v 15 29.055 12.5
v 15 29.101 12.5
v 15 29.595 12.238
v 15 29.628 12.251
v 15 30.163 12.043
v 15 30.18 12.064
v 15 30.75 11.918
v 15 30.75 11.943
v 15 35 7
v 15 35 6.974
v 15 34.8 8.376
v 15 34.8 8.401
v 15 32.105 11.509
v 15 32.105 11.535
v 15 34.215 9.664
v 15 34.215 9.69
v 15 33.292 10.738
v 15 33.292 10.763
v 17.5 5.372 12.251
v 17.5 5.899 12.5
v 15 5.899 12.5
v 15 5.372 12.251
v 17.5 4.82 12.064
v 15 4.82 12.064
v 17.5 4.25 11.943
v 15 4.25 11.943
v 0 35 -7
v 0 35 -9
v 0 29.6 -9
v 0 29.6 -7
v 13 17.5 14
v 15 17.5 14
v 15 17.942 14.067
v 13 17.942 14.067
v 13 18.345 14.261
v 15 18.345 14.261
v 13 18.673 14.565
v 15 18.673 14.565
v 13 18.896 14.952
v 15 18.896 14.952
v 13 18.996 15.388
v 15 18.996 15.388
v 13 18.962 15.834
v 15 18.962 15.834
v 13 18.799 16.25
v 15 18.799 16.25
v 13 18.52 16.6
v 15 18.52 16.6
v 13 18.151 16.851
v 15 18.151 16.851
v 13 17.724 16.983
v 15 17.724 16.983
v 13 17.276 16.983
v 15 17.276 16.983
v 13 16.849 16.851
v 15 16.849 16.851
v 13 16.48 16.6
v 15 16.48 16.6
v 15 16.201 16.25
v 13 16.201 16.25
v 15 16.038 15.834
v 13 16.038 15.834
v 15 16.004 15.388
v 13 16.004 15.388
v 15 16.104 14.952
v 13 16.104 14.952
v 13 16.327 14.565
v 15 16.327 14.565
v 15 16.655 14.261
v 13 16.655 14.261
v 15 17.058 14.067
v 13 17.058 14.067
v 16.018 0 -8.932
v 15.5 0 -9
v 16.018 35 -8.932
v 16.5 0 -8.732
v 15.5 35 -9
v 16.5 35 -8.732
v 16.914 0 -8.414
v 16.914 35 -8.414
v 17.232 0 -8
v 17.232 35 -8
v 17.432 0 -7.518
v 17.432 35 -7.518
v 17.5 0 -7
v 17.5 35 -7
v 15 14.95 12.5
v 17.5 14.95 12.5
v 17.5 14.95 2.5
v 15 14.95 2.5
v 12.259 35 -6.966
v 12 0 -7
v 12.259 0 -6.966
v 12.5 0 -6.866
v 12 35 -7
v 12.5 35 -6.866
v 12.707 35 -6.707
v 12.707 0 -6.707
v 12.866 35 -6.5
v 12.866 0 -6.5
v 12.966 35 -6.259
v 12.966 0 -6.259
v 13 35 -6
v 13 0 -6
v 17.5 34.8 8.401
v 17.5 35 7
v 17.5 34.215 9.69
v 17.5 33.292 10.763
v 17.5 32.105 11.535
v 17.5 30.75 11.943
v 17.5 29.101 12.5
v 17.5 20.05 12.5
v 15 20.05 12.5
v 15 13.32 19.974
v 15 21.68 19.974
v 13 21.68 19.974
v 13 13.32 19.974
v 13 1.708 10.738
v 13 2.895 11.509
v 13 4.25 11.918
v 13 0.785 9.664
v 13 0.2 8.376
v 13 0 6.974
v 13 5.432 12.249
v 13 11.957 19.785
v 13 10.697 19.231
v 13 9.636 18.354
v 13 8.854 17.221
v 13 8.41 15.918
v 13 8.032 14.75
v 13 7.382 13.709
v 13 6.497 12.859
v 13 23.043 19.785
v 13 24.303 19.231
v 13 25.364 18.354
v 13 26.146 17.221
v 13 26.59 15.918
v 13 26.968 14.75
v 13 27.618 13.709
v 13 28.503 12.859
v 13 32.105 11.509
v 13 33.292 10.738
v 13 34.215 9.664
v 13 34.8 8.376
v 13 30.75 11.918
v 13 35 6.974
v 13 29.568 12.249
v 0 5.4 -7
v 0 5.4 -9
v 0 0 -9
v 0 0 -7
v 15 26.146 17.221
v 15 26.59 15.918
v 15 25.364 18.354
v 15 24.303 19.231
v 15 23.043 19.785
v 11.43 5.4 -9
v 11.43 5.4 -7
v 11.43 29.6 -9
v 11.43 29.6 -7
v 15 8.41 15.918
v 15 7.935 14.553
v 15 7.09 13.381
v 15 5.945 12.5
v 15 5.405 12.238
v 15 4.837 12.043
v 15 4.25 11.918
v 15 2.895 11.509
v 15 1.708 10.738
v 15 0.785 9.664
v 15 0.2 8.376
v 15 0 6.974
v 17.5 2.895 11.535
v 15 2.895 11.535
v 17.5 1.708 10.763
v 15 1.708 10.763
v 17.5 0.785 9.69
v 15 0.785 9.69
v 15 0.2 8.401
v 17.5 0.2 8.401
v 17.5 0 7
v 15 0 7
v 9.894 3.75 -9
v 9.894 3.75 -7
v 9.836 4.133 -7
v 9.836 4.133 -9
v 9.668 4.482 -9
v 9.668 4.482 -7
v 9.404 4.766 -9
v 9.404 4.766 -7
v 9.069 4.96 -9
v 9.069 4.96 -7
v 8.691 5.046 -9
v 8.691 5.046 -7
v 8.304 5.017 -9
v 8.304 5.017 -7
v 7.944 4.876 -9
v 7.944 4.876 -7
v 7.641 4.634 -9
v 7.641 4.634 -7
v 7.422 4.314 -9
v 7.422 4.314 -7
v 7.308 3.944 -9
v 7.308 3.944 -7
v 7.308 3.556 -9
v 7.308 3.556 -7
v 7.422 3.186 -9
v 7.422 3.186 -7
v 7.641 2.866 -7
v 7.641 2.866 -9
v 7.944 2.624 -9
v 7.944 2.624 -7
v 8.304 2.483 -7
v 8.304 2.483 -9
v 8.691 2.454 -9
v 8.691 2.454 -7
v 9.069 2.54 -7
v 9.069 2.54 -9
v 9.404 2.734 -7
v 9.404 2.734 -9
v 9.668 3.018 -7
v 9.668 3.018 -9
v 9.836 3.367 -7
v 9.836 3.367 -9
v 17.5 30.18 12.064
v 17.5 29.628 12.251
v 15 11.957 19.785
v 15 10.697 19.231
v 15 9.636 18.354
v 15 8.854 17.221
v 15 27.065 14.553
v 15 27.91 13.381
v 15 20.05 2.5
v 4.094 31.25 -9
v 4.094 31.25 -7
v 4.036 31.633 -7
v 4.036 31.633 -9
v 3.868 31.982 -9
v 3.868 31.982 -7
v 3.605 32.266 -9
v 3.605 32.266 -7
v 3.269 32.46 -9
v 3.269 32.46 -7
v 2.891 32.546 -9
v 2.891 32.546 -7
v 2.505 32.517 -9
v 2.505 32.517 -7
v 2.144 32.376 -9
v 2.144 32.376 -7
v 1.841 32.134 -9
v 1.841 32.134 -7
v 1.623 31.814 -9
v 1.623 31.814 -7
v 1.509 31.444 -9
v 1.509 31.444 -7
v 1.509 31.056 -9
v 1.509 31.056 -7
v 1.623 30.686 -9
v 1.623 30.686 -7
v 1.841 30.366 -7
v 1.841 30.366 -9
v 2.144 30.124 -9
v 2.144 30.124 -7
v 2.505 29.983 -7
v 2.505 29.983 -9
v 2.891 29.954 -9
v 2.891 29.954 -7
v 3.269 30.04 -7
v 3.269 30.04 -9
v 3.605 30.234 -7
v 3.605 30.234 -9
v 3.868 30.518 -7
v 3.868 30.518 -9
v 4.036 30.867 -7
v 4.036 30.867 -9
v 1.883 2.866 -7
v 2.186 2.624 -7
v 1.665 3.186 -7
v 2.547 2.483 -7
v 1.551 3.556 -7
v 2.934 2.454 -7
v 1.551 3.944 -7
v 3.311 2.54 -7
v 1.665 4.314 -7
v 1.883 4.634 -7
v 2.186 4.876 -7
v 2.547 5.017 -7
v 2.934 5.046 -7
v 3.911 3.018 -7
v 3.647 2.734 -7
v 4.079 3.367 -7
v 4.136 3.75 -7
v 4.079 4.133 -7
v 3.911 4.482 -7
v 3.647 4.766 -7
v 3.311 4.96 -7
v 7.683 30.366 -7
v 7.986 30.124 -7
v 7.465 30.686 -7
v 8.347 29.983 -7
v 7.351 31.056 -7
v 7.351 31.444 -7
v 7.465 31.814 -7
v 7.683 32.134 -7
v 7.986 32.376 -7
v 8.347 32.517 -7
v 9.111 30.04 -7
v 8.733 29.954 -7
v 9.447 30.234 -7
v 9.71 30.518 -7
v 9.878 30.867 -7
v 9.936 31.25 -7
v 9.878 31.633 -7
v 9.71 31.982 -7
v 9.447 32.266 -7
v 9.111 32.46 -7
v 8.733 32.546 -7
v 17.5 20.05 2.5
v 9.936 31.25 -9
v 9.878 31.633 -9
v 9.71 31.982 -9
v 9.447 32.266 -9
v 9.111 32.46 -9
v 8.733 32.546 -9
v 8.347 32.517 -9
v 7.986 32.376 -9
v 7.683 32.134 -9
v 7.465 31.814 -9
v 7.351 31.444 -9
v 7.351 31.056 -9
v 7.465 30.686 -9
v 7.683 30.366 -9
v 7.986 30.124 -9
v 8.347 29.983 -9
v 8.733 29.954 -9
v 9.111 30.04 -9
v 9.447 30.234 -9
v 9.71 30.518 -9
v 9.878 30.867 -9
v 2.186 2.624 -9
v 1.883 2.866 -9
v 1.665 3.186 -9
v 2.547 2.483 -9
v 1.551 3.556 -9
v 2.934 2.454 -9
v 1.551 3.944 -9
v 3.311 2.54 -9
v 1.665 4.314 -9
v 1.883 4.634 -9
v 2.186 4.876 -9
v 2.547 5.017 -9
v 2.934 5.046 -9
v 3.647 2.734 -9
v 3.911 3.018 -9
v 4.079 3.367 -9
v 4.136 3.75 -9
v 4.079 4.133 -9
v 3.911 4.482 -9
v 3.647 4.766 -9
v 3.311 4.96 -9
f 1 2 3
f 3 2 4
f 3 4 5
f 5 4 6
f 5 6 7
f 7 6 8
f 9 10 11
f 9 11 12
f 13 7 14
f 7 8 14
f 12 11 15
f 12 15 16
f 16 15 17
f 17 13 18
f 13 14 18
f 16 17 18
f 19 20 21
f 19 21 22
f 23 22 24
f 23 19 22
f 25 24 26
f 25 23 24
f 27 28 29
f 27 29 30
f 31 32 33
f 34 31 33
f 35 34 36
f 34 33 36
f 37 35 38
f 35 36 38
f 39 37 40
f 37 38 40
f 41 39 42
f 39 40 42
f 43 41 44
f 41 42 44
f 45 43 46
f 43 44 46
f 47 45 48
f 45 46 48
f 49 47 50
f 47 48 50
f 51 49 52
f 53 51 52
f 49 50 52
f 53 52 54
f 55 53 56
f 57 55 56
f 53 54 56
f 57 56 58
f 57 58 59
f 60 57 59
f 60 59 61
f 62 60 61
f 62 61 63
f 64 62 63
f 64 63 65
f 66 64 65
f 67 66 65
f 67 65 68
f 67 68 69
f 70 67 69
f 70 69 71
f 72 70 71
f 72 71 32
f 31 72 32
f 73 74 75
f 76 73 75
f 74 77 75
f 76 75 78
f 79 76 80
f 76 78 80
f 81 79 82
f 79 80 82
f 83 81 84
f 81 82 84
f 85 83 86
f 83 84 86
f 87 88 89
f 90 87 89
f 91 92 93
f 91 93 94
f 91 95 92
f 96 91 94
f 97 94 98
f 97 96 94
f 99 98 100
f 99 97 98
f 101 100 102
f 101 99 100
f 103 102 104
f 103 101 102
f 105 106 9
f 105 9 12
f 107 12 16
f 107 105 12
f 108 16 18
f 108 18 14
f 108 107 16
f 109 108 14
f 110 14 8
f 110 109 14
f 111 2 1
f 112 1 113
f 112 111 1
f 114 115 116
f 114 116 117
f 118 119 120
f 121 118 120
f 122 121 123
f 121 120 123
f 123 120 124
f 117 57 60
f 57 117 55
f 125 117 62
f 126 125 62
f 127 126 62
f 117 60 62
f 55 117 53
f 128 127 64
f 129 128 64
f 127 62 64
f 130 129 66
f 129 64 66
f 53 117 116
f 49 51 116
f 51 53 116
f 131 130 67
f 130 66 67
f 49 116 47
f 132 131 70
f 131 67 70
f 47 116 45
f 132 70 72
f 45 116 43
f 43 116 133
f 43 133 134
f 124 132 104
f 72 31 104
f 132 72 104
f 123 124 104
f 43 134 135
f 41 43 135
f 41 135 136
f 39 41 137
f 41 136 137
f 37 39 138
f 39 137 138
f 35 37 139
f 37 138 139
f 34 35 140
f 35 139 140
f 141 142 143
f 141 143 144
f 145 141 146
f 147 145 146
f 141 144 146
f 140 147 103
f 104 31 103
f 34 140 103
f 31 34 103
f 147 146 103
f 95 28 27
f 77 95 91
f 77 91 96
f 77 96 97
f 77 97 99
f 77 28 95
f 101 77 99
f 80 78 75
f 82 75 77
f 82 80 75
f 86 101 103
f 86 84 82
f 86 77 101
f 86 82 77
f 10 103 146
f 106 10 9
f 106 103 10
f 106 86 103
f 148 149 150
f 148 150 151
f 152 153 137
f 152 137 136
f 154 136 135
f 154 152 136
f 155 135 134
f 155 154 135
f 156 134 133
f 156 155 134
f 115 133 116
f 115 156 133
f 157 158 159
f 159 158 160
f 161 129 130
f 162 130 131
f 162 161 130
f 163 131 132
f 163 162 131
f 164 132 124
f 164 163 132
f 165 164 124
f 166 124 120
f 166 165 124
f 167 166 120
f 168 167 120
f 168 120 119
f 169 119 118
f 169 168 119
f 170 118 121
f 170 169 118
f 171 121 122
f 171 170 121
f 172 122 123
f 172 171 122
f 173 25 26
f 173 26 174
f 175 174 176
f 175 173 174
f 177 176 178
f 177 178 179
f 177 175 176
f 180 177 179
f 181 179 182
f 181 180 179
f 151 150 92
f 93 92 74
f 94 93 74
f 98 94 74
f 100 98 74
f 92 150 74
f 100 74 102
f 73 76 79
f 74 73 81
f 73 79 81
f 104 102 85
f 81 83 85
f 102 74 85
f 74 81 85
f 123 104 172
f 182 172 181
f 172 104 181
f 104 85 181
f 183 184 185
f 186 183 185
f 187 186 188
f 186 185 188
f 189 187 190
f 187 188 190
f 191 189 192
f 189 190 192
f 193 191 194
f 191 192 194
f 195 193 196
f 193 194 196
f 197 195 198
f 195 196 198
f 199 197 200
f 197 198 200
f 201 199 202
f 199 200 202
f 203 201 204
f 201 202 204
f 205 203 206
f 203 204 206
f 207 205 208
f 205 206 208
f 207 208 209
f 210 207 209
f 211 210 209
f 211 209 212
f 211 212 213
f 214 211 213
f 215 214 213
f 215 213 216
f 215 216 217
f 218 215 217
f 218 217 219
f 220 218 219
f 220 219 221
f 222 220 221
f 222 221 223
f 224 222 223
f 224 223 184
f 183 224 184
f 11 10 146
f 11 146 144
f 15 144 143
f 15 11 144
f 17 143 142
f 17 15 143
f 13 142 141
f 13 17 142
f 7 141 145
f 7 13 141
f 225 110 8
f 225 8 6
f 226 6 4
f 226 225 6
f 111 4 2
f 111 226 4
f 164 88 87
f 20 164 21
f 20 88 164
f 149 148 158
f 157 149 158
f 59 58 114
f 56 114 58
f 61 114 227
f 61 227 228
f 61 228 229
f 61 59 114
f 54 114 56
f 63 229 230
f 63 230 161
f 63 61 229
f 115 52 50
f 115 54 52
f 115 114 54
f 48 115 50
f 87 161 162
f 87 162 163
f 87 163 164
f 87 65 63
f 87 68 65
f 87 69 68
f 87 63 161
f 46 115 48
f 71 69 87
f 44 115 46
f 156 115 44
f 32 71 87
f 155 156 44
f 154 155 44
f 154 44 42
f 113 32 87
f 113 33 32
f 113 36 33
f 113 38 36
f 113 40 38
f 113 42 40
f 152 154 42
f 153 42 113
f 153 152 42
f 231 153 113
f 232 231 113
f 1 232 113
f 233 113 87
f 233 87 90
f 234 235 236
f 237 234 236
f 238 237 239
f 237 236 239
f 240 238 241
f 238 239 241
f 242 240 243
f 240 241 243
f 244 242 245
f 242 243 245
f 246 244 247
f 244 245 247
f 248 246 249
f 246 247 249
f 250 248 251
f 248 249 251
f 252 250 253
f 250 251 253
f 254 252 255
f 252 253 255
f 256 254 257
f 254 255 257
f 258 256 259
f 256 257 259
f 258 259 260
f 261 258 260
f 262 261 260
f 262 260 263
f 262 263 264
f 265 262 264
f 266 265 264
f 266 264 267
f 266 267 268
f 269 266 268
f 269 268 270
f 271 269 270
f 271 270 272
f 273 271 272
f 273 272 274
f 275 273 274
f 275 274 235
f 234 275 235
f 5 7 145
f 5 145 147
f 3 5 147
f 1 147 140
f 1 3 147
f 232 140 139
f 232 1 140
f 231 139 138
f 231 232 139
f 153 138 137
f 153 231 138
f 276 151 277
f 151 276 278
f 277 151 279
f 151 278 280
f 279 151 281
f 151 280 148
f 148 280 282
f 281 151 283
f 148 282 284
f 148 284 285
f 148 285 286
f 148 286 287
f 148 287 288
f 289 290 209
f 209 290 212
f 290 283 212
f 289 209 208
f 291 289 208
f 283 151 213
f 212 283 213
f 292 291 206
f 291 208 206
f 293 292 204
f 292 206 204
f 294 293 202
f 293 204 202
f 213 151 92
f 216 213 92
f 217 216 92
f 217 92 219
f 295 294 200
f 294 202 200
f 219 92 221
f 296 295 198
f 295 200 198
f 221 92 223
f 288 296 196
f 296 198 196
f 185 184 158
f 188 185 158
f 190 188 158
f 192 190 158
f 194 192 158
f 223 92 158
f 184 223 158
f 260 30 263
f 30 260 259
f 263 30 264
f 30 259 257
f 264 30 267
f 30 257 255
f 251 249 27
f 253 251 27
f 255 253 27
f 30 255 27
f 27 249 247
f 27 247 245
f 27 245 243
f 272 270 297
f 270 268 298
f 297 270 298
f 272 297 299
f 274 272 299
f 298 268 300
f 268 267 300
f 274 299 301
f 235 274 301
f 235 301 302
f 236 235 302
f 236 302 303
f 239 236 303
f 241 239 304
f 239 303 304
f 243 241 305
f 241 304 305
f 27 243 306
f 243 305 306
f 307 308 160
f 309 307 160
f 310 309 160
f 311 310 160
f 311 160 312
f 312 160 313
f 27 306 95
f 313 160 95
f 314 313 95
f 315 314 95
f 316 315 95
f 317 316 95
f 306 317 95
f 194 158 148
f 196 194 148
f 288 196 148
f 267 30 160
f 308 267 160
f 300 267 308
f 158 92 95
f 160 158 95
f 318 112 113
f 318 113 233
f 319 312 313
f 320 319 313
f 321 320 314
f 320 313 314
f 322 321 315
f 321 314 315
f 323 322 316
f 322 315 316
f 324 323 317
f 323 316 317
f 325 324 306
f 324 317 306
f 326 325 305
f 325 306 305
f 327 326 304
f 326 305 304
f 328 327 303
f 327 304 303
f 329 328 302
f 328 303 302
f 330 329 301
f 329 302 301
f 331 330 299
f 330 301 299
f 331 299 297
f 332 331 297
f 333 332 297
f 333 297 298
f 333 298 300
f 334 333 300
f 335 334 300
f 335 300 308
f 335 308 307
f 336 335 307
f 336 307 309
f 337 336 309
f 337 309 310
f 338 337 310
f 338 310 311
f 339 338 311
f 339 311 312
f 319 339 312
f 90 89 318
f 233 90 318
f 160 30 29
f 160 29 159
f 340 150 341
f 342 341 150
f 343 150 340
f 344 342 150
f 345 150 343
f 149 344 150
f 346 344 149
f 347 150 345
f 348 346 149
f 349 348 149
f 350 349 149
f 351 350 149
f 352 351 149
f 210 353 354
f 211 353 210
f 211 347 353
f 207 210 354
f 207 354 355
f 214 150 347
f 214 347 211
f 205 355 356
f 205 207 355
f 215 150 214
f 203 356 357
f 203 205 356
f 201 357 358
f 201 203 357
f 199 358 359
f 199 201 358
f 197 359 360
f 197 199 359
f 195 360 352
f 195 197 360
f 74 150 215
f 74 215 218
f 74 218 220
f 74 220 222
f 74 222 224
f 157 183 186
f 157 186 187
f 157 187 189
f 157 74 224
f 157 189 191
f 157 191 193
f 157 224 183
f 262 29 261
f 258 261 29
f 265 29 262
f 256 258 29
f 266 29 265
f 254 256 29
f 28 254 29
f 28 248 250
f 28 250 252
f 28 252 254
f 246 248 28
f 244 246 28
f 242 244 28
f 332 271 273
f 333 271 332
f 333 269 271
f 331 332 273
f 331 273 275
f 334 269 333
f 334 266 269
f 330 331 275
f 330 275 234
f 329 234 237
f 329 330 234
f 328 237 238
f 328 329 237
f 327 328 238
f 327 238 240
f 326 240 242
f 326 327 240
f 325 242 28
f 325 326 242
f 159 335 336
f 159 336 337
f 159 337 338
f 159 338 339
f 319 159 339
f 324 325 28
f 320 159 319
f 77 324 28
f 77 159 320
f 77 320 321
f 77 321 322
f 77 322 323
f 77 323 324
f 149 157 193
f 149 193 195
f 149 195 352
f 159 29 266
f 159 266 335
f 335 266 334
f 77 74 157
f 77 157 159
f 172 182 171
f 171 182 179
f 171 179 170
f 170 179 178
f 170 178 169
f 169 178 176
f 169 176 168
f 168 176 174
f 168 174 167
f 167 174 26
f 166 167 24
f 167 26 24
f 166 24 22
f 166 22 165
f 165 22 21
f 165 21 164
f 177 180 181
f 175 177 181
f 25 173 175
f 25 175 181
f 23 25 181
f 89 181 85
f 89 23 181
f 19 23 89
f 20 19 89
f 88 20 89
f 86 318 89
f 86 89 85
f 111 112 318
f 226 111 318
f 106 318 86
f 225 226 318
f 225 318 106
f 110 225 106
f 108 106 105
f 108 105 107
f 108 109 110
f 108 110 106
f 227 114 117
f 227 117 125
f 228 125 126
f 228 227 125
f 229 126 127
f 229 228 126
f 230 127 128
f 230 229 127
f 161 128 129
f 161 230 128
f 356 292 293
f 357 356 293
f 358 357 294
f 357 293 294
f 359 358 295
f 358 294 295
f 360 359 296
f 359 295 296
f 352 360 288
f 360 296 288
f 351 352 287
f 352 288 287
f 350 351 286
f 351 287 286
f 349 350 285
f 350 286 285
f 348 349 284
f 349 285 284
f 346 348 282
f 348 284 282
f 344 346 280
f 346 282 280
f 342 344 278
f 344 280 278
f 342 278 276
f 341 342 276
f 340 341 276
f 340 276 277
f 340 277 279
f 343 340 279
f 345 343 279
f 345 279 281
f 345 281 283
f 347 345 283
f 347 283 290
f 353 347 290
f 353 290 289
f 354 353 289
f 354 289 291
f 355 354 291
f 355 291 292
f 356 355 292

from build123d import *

# Parameters (mm, degrees)
BOSS_EXTRU_1_DEPTH                  = 2.5
ESQUISSE2_W                         = 2.5
ESQUISSE2_H                         = 35
BOSS_EXTRU_2_DEPTH                  = 16
BOSS_EXTRU_3_DEPTH                  = 2
ESQUISSE4_W                         = 2
ESQUISSE4_H                         = 35
BOSS_EXTRU_4_DEPTH                  = 13
ESQUISSE5_W                         = 10
ESQUISSE5_H                         = 5.1
ENL_V_MAT_EXTRU_1_DEPTH             = 2.5
ESQUISSE6_W                         = 11.43
ESQUISSE6_H                         = 24.2
ENL_V_MAT_EXTRU_2_DEPTH             = 3
DIAM_TRE_DU_PER_AGE_2_6_2_6_1_D     = 2.6
DIAM_TRE_DU_PER_AGE_2_6_2_6_1_DEPTH = 28.974295462
DIAM_TRE_DU_PER_AGE_3_0_3_1_D       = 3
DIAM_TRE_DU_PER_AGE_3_0_3_1_DEPTH   = 4.5
CONG_1_R                            = 1
CONG_2_R                            = 2


with BuildPart() as part:
    # Esquisse1 → Boss.-Extru.1 (new body)
    with BuildSketch(Plane(origin=(17.5, 0, 0), x_dir=(0, 0, -1), z_dir=(1, 0, 0))):
        with BuildLine():
            Line((-7, 0), (-7, 35))
            ThreePointArc((-7, 35), (-10.259601203, 33.791437722), (-11.943429983, 30.75))
            ThreePointArc((-11.943429983, 30.75), (-12.14941104, 29.901069836), (-12.5, 29.100946096))
            Line((-12.5, 29.100946096), (-12.5, 5.899053904))
            ThreePointArc((-12.5, 5.899053904), (-12.14941104, 5.098930164), (-11.943429983, 4.25))
            ThreePointArc((-11.943429983, 4.25), (-10.259601203, 1.208562278), (-7, 0))
        make_face()
    extrude(amount=-BOSS_EXTRU_1_DEPTH)

    # Esquisse2 → Boss.-Extru.2 (add)
    with BuildSketch(Plane(origin=(0, 0, 7), x_dir=(-1, 0, 0), z_dir=(0, 0, -1))):
        with Locations((-16.25, 17.5)):
            Rectangle(ESQUISSE2_W, ESQUISSE2_H)
    extrude(amount=BOSS_EXTRU_2_DEPTH)

    # Esquisse3 → Boss.-Extru.3 (add)
    with BuildSketch(Plane.ZY.offset(-15)):
        with BuildLine():
            Line((19.974295462, 21.679625289), (19.974295462, 13.320374711))
            ThreePointArc((19.974295462, 13.320374711), (18.828977674, 10.135814295), (15.917725445, 8.410187356))
            ThreePointArc((15.917725445, 8.410187356), (13.256912127, 6.965462484), (11.917725445, 4.25))
            ThreePointArc((11.917725445, 4.25), (10.233896665, 1.208562278), (6.974295462, 0))
            Line((6.974295462, 0), (-9, 0))
            Line((-9, 0), (-9, 35))
            Line((-9, 35), (6.974295462, 35))
            ThreePointArc((6.974295462, 35), (10.233896665, 33.791437722), (11.917725445, 30.75))
            ThreePointArc((11.917725445, 30.75), (13.256912127, 28.034537516), (15.917725445, 26.589812644))
            ThreePointArc((15.917725445, 26.589812644), (18.828977674, 24.864185705), (19.974295462, 21.679625289))
        make_face()
    extrude(amount=BOSS_EXTRU_3_DEPTH)

    # Esquisse4 → Boss.-Extru.4 (add)
    with BuildSketch(Plane.ZY.offset(-13)):
        with Locations((-8, 17.5)):
            Rectangle(ESQUISSE4_W, ESQUISSE4_H)
    extrude(amount=BOSS_EXTRU_4_DEPTH)

    # Esquisse5 → Enlèv. mat.-Extru.1 (cut)
    with BuildSketch(Plane(origin=(17.5, 0, 0), x_dir=(0, 0, -1), z_dir=(1, 0, 0))):
        with Locations((-7.5, 17.5)):
            Rectangle(ESQUISSE5_W, ESQUISSE5_H)
    extrude(amount=-ENL_V_MAT_EXTRU_1_DEPTH, mode=Mode.SUBTRACT)

    # Esquisse6 → Enlèv. mat.-Extru.2 (cut, through all)
    with BuildSketch(Plane.XY.offset(-7)):
        with Locations((5.715, 17.5)):
            Rectangle(ESQUISSE6_W, ESQUISSE6_H)
    extrude(amount=-ENL_V_MAT_EXTRU_2_DEPTH, mode=Mode.SUBTRACT)

    # Diamètre du perçage Ø2.6 (2.6)1
    with Locations(Plane(origin=(0, 0, -9), x_dir=(-1, 0, 0), z_dir=(0, 0, -1))):
        with Locations((-8.593600322, 3.75), (-8.636, 31.25), (-2.794, 31.25), (-2.836399678, 3.75)):
            Hole(DIAM_TRE_DU_PER_AGE_2_6_2_6_1_D / 2, depth=DIAM_TRE_DU_PER_AGE_2_6_2_6_1_DEPTH)

    # Diamètre du perçage Ø3.0 (3)1
    with Locations(Plane.ZY.offset(-13)):
        with Locations((15.5, 17.5)):
            Hole(DIAM_TRE_DU_PER_AGE_3_0_3_1_D / 2, depth=DIAM_TRE_DU_PER_AGE_3_0_3_1_DEPTH)

    # Congé1
    cong_1_edges = [part.edges().sort_by_distance(p)[0] for p in [
        (13, 17.5, -7),
    ]]
    fillet(cong_1_edges, radius=CONG_1_R)

    # Congé2
    cong_2_edges = [part.edges().sort_by_distance(p)[0] for p in [
        (17.5, 17.5, -9),
    ]]
    fillet(cong_2_edges, radius=CONG_2_R)


solid = part.part
